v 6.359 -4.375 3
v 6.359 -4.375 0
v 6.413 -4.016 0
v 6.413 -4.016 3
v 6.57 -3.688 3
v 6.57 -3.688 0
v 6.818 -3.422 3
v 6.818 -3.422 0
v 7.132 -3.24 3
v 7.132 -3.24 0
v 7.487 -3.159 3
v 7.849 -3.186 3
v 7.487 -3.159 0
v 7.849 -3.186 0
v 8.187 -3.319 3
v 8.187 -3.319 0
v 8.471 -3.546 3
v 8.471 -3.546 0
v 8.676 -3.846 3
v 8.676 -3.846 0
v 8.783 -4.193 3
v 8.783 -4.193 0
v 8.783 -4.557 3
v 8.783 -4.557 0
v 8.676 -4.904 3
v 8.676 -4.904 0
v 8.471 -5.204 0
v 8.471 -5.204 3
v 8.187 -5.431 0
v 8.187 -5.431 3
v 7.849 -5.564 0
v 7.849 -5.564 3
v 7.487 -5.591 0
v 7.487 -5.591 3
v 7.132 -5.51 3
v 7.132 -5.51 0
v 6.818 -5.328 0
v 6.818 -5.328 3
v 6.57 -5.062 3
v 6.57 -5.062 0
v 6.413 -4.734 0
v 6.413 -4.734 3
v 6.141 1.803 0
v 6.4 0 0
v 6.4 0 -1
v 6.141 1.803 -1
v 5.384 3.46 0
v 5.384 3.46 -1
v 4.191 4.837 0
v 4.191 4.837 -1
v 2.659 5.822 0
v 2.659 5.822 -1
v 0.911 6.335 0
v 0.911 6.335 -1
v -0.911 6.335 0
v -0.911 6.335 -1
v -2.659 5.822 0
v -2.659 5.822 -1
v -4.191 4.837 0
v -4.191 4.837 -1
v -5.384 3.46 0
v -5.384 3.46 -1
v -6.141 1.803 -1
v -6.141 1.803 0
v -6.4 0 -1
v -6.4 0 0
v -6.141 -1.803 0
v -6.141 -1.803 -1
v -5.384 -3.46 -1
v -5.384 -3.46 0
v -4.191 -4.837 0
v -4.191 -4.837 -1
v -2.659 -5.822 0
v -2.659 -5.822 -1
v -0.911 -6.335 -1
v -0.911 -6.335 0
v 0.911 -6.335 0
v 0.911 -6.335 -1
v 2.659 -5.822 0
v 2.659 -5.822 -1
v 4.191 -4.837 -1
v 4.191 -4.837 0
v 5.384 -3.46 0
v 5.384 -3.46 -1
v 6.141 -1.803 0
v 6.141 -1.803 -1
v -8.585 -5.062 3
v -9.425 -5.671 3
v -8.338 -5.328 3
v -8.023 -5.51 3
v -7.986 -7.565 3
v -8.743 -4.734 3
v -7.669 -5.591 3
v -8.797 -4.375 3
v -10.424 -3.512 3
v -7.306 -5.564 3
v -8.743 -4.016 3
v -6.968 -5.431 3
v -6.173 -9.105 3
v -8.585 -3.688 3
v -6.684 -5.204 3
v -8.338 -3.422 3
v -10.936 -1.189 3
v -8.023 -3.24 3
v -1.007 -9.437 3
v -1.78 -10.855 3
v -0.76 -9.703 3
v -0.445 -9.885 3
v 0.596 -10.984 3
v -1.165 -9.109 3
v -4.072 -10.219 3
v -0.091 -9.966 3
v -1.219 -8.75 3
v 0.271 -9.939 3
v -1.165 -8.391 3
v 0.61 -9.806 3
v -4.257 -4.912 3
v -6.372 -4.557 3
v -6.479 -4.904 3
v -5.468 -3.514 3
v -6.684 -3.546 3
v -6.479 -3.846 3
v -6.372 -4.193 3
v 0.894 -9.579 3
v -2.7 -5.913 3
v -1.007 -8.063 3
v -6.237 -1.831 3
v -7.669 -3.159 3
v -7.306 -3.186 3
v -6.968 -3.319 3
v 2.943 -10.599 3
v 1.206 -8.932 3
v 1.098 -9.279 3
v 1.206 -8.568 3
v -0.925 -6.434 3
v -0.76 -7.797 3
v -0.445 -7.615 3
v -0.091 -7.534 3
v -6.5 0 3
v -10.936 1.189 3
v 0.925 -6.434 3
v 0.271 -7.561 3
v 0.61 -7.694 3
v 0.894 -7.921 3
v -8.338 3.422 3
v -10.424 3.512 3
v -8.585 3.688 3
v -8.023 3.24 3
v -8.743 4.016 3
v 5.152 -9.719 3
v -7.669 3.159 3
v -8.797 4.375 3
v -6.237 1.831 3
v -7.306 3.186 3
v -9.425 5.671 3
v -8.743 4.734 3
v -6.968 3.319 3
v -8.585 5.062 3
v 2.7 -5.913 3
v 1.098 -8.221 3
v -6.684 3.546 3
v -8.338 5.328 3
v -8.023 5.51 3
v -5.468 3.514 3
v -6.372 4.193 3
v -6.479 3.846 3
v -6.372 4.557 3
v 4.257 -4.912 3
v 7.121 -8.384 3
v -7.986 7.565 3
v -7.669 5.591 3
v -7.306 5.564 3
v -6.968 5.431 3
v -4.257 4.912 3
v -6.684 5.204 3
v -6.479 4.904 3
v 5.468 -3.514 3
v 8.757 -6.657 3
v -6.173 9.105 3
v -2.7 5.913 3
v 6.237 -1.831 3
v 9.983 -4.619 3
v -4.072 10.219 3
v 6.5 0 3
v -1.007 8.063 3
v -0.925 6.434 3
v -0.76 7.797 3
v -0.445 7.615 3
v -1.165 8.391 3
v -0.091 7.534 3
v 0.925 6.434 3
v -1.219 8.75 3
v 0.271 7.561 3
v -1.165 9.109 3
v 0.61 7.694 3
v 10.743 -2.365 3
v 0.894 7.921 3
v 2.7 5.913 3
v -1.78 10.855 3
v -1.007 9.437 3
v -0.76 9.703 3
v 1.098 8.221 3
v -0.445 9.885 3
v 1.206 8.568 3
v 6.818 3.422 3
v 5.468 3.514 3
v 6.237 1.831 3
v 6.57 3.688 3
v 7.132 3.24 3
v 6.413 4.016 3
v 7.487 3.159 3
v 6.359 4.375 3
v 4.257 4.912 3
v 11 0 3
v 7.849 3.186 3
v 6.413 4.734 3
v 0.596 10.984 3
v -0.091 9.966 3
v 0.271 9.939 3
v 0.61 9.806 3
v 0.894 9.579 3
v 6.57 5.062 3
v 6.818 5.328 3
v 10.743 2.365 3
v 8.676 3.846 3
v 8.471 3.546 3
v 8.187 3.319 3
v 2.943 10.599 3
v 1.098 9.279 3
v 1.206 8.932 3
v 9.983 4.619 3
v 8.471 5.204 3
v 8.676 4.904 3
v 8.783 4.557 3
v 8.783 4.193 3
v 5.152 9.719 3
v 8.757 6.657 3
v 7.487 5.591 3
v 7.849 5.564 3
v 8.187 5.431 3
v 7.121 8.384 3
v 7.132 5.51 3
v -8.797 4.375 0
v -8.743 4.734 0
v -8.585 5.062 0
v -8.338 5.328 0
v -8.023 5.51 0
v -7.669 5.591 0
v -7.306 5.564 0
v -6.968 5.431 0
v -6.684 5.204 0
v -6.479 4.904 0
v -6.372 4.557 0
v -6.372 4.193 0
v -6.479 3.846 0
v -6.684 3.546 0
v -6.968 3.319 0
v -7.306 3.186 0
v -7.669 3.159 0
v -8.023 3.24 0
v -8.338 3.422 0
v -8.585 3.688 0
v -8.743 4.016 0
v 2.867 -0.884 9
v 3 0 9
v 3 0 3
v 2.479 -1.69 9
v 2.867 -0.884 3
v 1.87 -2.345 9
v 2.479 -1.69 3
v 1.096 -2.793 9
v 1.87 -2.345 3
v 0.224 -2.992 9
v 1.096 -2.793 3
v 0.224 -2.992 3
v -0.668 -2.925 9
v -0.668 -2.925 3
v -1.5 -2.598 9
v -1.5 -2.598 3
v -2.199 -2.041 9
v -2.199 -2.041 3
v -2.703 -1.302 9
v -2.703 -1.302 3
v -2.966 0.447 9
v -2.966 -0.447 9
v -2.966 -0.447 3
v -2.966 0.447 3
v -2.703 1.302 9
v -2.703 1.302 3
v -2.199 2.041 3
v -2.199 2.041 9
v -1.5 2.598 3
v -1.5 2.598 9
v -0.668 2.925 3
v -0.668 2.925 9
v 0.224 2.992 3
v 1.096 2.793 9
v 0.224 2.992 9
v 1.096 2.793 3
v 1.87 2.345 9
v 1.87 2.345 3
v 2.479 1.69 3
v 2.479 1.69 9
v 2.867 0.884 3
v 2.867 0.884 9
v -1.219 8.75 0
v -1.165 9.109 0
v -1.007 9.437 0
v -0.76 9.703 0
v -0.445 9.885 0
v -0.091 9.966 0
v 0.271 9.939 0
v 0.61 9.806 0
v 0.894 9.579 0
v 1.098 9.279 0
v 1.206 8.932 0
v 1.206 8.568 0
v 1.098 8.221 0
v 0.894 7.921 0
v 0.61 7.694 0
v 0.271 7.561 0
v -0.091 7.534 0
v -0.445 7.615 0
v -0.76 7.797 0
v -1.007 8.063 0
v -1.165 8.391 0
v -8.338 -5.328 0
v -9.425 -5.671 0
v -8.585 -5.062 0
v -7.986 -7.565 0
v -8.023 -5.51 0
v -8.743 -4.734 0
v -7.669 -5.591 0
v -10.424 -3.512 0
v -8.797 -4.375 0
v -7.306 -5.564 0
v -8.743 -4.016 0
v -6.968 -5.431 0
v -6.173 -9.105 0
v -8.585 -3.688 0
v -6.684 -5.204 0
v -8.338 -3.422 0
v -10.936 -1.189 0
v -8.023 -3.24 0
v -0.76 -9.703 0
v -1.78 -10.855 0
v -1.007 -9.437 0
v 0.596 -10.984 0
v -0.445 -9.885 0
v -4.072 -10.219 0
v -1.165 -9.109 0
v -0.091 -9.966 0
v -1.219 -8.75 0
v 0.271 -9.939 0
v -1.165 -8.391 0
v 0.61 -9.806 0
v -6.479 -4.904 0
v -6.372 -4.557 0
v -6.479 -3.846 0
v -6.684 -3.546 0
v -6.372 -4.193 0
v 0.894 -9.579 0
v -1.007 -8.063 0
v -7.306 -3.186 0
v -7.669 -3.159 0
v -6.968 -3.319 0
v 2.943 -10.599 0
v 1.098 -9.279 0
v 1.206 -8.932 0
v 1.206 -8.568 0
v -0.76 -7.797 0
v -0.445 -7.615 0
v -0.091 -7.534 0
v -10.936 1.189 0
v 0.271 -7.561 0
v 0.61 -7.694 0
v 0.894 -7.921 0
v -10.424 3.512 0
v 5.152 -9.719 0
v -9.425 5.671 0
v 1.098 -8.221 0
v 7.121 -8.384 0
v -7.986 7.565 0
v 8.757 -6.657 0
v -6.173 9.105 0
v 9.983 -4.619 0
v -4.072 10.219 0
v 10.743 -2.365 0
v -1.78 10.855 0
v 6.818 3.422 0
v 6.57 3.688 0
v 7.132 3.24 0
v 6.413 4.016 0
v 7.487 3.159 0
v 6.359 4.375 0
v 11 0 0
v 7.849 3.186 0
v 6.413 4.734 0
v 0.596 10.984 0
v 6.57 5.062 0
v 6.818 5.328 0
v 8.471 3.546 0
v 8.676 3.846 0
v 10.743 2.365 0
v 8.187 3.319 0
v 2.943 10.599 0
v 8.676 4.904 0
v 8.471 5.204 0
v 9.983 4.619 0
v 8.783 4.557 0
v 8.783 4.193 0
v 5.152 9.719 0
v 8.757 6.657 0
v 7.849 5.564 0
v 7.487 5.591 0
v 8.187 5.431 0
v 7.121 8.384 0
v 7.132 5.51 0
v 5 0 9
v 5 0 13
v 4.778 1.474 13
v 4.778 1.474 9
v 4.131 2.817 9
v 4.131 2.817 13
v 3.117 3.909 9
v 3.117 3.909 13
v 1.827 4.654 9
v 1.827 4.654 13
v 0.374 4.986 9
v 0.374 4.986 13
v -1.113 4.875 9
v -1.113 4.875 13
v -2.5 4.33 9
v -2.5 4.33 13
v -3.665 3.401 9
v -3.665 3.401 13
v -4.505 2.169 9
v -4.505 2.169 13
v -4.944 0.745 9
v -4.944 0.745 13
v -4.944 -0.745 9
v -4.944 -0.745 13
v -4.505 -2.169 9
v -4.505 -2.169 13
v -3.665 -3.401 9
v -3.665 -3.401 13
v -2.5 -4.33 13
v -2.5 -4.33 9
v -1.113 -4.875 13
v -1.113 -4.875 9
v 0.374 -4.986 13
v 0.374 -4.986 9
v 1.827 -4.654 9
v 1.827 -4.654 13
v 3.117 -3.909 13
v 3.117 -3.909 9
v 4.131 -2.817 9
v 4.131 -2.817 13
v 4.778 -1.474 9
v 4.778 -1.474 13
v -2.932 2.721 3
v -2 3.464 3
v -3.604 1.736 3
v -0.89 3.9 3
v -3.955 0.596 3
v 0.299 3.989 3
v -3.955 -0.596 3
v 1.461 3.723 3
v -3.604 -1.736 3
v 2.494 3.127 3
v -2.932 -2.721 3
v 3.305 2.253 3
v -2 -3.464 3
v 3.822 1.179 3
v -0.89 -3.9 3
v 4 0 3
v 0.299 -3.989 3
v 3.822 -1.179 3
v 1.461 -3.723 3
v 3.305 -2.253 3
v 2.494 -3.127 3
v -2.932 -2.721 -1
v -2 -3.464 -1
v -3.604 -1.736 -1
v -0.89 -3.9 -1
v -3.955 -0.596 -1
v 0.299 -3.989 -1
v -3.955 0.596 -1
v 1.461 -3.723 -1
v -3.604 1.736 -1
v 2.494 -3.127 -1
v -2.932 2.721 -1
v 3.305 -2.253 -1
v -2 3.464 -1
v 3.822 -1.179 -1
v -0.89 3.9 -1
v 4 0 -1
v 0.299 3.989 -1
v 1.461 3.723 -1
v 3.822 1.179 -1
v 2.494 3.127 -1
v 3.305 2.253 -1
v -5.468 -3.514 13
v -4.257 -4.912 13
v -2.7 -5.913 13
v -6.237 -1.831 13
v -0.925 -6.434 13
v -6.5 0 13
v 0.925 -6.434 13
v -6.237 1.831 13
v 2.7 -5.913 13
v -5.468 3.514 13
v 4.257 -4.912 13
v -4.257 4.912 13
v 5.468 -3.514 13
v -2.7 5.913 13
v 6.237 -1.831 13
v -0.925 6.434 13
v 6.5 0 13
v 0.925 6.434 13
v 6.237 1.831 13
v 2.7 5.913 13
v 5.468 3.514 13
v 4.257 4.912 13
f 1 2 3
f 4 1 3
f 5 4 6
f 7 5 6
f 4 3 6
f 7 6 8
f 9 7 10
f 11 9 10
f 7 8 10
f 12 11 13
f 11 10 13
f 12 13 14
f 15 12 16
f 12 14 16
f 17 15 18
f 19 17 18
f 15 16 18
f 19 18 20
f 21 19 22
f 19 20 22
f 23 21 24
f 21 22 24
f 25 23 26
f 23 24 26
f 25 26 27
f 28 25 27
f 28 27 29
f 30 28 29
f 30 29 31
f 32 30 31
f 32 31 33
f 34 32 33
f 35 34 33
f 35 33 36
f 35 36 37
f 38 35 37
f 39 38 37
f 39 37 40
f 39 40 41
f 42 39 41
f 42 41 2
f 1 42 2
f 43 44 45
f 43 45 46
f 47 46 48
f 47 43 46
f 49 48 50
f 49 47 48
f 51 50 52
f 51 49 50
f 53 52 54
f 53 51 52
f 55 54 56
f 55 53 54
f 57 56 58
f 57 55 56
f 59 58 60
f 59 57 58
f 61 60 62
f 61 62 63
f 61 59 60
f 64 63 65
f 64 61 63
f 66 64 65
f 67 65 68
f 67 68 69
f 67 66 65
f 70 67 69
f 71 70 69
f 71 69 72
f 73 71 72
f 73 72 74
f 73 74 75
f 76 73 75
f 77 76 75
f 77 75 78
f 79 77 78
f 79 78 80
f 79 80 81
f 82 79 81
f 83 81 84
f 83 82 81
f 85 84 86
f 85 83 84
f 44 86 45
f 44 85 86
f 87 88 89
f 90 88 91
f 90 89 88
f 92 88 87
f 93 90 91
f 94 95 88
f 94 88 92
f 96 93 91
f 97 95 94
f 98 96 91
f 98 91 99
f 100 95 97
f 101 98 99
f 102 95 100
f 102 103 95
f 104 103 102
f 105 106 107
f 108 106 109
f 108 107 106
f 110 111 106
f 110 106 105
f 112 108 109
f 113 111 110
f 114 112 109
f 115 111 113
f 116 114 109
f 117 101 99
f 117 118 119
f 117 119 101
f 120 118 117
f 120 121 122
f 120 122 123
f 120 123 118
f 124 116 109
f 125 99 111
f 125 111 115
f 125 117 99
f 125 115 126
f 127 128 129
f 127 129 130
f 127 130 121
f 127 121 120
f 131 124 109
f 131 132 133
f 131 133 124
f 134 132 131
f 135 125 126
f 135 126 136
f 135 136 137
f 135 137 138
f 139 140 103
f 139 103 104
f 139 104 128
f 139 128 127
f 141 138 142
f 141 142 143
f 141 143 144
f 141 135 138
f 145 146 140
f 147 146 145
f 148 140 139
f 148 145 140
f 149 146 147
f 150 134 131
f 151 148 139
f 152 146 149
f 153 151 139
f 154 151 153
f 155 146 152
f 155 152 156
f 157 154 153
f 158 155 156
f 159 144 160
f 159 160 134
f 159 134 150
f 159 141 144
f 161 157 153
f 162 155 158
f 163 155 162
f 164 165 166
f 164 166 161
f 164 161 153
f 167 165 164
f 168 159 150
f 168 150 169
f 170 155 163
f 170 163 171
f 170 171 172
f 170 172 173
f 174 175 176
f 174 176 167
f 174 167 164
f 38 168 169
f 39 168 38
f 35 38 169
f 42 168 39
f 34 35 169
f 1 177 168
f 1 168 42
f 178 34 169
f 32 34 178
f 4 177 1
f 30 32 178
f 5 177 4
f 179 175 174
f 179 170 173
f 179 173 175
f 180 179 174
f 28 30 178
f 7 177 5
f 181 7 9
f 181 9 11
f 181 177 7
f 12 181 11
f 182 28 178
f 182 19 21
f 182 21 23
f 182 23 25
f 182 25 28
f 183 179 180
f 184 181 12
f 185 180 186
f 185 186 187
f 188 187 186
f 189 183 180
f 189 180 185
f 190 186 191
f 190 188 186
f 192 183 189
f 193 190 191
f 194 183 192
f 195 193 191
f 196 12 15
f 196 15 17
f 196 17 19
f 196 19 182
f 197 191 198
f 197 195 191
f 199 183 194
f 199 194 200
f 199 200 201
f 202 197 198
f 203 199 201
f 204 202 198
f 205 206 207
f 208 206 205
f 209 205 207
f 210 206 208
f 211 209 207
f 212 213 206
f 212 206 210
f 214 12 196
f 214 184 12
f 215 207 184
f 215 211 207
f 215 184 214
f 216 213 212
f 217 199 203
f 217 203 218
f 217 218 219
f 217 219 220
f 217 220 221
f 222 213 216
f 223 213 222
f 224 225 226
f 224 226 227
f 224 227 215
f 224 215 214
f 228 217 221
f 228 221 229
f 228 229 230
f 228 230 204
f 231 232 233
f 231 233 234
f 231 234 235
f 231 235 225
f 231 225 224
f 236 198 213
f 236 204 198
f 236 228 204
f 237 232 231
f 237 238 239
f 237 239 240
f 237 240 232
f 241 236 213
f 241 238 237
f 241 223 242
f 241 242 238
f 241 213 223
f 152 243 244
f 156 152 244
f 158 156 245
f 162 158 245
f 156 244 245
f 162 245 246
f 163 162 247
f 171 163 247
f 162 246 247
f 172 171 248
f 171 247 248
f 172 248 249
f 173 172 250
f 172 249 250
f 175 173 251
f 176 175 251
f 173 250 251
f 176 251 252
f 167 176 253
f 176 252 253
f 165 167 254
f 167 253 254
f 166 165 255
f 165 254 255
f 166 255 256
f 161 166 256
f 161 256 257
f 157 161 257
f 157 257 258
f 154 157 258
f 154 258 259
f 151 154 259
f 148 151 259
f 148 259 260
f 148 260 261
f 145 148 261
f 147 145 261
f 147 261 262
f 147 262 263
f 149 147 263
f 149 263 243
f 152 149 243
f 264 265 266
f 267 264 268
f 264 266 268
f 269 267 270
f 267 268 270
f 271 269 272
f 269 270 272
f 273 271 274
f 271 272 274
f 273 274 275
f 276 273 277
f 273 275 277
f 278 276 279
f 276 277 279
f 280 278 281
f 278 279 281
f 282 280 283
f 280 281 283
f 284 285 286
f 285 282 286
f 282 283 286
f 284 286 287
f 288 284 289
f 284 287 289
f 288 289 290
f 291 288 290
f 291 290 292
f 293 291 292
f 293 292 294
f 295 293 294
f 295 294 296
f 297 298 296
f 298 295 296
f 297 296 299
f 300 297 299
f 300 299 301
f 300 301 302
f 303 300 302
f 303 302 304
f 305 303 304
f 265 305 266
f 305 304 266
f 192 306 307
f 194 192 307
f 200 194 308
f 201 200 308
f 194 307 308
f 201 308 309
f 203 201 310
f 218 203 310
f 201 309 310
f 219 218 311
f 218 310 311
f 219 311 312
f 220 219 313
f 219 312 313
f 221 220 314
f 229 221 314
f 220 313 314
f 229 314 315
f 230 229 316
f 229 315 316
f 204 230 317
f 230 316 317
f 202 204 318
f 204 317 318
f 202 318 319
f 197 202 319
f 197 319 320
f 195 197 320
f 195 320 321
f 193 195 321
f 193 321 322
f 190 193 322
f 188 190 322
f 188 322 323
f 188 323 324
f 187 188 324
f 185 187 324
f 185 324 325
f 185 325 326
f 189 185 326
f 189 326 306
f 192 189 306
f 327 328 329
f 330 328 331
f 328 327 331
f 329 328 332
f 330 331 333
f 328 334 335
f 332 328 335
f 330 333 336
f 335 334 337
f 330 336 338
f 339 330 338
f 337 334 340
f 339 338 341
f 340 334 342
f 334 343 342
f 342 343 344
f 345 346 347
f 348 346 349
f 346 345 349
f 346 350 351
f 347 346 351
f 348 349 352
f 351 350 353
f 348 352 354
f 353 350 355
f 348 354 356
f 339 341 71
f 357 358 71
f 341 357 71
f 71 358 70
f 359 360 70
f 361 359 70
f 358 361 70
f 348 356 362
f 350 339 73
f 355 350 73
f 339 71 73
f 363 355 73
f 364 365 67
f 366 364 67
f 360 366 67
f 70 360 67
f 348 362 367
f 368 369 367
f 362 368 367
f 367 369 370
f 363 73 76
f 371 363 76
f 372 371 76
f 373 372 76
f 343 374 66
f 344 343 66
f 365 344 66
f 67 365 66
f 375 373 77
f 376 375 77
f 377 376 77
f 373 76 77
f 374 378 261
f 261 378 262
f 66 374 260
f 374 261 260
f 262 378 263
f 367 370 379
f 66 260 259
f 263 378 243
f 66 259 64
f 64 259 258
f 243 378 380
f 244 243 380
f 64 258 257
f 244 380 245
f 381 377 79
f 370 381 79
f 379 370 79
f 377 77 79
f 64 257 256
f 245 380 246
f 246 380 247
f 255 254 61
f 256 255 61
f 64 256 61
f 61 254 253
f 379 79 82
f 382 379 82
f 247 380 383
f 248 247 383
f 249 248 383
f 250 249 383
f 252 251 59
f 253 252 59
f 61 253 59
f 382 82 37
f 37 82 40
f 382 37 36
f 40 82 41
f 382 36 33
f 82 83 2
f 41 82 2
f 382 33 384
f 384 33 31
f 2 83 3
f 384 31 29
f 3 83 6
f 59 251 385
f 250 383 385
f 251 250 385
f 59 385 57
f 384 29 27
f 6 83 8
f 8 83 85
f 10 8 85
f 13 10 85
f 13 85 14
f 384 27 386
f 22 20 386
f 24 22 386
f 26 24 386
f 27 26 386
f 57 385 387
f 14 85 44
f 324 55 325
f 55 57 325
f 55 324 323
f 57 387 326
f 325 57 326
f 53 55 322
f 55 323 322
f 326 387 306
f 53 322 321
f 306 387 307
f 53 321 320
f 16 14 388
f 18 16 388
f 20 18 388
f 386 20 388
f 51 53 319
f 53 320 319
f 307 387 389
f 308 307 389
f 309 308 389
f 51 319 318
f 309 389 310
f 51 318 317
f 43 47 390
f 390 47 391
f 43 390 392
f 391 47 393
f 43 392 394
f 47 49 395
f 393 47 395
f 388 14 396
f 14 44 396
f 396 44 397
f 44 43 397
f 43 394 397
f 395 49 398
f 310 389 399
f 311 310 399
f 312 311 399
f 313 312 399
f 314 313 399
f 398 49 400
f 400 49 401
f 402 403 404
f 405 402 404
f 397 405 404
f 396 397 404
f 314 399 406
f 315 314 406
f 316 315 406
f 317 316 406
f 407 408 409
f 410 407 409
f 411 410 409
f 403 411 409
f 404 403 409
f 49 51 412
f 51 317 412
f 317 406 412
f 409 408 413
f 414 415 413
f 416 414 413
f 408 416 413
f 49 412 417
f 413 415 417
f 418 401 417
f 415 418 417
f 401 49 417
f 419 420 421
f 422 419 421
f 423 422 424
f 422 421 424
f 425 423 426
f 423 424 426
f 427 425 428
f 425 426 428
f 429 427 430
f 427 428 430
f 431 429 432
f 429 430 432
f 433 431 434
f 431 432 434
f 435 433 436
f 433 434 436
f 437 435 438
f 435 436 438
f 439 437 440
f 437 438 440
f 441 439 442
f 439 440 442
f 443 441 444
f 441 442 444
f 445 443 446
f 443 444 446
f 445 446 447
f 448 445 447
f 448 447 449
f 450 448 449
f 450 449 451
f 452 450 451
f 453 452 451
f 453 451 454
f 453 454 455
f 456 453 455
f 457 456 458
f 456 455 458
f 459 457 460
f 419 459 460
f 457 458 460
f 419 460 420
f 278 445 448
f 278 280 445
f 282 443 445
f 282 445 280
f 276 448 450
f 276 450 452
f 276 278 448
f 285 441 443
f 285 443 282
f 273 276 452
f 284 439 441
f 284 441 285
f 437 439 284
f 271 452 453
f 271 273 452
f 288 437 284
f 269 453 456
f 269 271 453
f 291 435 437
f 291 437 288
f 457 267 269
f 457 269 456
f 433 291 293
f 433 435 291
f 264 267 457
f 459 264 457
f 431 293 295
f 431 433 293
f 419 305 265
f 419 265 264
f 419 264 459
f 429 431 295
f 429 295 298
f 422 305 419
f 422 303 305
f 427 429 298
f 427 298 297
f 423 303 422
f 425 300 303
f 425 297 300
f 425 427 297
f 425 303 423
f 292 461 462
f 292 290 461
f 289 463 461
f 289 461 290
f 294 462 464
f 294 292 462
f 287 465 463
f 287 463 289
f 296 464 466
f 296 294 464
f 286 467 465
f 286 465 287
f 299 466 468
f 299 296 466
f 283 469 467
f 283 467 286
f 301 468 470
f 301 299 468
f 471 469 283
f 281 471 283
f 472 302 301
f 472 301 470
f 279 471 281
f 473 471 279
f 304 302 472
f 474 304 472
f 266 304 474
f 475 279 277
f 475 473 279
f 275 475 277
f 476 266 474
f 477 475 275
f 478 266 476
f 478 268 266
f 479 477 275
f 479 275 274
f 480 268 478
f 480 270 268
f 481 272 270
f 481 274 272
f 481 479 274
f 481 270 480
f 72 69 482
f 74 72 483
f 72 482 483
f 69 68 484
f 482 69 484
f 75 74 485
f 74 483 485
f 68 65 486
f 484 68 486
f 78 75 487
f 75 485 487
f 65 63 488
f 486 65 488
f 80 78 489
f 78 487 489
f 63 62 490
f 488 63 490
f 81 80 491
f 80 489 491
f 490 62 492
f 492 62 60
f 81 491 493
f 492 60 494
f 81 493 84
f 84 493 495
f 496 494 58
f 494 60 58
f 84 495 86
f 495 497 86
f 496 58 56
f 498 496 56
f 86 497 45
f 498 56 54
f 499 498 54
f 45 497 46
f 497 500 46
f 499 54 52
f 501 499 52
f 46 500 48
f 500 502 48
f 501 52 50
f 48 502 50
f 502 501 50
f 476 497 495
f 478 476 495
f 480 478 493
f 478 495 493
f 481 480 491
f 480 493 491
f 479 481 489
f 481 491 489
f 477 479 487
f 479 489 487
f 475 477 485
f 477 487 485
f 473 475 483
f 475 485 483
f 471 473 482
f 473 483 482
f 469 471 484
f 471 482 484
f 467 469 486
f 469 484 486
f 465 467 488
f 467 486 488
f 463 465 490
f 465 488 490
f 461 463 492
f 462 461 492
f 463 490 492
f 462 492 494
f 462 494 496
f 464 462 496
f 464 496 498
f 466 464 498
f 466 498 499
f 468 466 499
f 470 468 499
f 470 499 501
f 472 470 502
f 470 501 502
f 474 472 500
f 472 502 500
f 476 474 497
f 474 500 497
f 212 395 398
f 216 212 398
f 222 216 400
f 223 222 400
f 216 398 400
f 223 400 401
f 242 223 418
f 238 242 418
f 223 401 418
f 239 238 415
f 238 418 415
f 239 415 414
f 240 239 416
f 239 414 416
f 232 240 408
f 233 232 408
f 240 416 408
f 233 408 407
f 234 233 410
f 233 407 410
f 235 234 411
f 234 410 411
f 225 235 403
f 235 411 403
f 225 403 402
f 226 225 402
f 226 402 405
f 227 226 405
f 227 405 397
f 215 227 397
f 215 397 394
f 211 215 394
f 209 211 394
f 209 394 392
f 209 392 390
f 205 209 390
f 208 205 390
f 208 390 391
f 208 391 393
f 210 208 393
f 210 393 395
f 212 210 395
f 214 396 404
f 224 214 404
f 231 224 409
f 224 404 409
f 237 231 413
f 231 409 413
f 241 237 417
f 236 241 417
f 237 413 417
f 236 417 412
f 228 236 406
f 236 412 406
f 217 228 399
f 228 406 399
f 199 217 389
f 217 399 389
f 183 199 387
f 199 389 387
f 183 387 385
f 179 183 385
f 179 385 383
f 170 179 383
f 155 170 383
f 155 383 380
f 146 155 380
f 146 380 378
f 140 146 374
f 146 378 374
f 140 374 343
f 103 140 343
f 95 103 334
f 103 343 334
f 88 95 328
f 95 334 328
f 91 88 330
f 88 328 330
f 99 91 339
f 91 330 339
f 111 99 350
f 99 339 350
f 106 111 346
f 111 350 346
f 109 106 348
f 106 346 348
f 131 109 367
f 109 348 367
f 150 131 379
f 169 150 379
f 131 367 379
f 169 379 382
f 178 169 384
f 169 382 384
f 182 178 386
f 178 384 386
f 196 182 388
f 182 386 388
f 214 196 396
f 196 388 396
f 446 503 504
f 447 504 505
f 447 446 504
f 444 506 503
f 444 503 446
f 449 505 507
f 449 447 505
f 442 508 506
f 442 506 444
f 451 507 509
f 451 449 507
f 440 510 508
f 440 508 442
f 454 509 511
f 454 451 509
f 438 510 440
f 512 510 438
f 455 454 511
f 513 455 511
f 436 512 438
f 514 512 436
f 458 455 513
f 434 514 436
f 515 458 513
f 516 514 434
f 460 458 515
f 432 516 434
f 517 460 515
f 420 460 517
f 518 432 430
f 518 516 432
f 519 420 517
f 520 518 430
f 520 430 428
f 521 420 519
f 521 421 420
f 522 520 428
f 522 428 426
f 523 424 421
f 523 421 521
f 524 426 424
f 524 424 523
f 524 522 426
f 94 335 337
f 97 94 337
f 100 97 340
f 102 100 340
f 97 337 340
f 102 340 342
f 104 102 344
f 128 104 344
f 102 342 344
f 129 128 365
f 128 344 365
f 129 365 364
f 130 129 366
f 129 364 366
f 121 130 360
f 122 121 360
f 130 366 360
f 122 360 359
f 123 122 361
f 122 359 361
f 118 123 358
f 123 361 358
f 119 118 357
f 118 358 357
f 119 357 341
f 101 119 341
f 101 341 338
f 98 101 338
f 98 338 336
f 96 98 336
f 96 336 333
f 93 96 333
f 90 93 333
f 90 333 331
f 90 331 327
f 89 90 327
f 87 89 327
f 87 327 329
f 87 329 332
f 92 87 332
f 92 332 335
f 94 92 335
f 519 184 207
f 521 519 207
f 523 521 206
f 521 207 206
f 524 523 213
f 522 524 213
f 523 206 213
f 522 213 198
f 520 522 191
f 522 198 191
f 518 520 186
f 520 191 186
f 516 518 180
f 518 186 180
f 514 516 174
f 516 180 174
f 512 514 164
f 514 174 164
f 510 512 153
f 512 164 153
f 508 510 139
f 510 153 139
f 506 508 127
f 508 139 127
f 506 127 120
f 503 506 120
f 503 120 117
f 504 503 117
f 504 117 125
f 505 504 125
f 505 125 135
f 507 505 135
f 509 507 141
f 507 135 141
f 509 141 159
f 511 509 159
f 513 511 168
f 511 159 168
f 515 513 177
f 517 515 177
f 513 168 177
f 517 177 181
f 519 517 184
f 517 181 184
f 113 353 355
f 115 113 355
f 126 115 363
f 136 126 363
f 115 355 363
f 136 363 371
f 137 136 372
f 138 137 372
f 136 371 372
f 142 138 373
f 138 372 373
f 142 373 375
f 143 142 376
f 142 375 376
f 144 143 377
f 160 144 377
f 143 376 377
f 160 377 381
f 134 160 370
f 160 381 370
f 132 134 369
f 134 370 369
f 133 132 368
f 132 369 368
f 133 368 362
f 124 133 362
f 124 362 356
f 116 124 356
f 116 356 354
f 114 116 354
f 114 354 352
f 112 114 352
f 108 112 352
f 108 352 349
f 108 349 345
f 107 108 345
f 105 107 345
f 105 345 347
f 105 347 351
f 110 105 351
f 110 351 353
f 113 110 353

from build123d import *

# Parameters (mm, degrees)
F0_R      = 11
F1_DEPTH  = 3
F3_D      = 2.4384
F4_R      = 6.5
F4_R_2    = 4
F5_DEPTH  = 10
F6_R      = 3
F7_DEPTH  = 13.001
F8_R      = 5
F8_R_2    = 3
F9_DEPTH  = 4
F10_R     = 6.4
F11_DEPTH = 1
F12_R     = 4
F13_DEPTH = 4


with BuildPart() as f1:
    # F0 (on Top) → F1 (new body)
    with BuildSketch(Plane.XY):
        Circle(F0_R)
        Polygon((7.5777222831, 4.375), (7.5777222831, -4.375), (0, -8.75), (-7.5777222831, -4.375), (-7.5777222831, 4.375), (0, 8.75), align=None, mode=Mode.SUBTRACT)
        Polygon((0, -8.75), (7.5777222831, -4.375), (7.5777222831, 4.375), (0, 8.75), (-7.5777222831, 4.375), (-7.5777222831, -4.375), align=None)
    extrude(amount=F1_DEPTH)

    # F3 (through all)
    with Locations(Plane.XY.offset(3)):
        with Locations((0, 8.75), (7.5777222831, 4.375), (7.5777222831, -4.375), (0, -8.75), (-7.5777222831, -4.375), (-7.5777222831, 4.375)):
            Hole(F3_D / 2)

    # F4 (on face) → F5 (join)
    with BuildSketch(Plane.XY.offset(3)):
        Circle(F4_R)
        Circle(F4_R_2, mode=Mode.SUBTRACT)
        Circle(F4_R_2)
    extrude(amount=F5_DEPTH)

    # F6 (on face) → F7 (cut, through all)
    with BuildSketch(Plane(origin=(0, 0, 0), x_dir=(1, 0, 0), z_dir=(0, 0, -1))):
        Circle(F6_R)
    extrude(amount=-F7_DEPTH, mode=Mode.SUBTRACT)

    # F8 (on face) → F9 (cut)
    with BuildSketch(Plane.XY.offset(13)):
        Circle(F8_R)
        Circle(F8_R_2, mode=Mode.SUBTRACT)
    extrude(amount=-F9_DEPTH, mode=Mode.SUBTRACT)

    # F10 (on Top) → F11 (join)
    with BuildSketch(Plane.XY):
        Circle(F10_R)
    extrude(amount=-F11_DEPTH)

    # F12 (on face) → F13 (cut)
    with BuildSketch(Plane(origin=(0, 0, -1), x_dir=(1, 0, 0), z_dir=(0, 0, -1))):
        Circle(F12_R)
    extrude(amount=-F13_DEPTH, mode=Mode.SUBTRACT)


solid = f1.part
